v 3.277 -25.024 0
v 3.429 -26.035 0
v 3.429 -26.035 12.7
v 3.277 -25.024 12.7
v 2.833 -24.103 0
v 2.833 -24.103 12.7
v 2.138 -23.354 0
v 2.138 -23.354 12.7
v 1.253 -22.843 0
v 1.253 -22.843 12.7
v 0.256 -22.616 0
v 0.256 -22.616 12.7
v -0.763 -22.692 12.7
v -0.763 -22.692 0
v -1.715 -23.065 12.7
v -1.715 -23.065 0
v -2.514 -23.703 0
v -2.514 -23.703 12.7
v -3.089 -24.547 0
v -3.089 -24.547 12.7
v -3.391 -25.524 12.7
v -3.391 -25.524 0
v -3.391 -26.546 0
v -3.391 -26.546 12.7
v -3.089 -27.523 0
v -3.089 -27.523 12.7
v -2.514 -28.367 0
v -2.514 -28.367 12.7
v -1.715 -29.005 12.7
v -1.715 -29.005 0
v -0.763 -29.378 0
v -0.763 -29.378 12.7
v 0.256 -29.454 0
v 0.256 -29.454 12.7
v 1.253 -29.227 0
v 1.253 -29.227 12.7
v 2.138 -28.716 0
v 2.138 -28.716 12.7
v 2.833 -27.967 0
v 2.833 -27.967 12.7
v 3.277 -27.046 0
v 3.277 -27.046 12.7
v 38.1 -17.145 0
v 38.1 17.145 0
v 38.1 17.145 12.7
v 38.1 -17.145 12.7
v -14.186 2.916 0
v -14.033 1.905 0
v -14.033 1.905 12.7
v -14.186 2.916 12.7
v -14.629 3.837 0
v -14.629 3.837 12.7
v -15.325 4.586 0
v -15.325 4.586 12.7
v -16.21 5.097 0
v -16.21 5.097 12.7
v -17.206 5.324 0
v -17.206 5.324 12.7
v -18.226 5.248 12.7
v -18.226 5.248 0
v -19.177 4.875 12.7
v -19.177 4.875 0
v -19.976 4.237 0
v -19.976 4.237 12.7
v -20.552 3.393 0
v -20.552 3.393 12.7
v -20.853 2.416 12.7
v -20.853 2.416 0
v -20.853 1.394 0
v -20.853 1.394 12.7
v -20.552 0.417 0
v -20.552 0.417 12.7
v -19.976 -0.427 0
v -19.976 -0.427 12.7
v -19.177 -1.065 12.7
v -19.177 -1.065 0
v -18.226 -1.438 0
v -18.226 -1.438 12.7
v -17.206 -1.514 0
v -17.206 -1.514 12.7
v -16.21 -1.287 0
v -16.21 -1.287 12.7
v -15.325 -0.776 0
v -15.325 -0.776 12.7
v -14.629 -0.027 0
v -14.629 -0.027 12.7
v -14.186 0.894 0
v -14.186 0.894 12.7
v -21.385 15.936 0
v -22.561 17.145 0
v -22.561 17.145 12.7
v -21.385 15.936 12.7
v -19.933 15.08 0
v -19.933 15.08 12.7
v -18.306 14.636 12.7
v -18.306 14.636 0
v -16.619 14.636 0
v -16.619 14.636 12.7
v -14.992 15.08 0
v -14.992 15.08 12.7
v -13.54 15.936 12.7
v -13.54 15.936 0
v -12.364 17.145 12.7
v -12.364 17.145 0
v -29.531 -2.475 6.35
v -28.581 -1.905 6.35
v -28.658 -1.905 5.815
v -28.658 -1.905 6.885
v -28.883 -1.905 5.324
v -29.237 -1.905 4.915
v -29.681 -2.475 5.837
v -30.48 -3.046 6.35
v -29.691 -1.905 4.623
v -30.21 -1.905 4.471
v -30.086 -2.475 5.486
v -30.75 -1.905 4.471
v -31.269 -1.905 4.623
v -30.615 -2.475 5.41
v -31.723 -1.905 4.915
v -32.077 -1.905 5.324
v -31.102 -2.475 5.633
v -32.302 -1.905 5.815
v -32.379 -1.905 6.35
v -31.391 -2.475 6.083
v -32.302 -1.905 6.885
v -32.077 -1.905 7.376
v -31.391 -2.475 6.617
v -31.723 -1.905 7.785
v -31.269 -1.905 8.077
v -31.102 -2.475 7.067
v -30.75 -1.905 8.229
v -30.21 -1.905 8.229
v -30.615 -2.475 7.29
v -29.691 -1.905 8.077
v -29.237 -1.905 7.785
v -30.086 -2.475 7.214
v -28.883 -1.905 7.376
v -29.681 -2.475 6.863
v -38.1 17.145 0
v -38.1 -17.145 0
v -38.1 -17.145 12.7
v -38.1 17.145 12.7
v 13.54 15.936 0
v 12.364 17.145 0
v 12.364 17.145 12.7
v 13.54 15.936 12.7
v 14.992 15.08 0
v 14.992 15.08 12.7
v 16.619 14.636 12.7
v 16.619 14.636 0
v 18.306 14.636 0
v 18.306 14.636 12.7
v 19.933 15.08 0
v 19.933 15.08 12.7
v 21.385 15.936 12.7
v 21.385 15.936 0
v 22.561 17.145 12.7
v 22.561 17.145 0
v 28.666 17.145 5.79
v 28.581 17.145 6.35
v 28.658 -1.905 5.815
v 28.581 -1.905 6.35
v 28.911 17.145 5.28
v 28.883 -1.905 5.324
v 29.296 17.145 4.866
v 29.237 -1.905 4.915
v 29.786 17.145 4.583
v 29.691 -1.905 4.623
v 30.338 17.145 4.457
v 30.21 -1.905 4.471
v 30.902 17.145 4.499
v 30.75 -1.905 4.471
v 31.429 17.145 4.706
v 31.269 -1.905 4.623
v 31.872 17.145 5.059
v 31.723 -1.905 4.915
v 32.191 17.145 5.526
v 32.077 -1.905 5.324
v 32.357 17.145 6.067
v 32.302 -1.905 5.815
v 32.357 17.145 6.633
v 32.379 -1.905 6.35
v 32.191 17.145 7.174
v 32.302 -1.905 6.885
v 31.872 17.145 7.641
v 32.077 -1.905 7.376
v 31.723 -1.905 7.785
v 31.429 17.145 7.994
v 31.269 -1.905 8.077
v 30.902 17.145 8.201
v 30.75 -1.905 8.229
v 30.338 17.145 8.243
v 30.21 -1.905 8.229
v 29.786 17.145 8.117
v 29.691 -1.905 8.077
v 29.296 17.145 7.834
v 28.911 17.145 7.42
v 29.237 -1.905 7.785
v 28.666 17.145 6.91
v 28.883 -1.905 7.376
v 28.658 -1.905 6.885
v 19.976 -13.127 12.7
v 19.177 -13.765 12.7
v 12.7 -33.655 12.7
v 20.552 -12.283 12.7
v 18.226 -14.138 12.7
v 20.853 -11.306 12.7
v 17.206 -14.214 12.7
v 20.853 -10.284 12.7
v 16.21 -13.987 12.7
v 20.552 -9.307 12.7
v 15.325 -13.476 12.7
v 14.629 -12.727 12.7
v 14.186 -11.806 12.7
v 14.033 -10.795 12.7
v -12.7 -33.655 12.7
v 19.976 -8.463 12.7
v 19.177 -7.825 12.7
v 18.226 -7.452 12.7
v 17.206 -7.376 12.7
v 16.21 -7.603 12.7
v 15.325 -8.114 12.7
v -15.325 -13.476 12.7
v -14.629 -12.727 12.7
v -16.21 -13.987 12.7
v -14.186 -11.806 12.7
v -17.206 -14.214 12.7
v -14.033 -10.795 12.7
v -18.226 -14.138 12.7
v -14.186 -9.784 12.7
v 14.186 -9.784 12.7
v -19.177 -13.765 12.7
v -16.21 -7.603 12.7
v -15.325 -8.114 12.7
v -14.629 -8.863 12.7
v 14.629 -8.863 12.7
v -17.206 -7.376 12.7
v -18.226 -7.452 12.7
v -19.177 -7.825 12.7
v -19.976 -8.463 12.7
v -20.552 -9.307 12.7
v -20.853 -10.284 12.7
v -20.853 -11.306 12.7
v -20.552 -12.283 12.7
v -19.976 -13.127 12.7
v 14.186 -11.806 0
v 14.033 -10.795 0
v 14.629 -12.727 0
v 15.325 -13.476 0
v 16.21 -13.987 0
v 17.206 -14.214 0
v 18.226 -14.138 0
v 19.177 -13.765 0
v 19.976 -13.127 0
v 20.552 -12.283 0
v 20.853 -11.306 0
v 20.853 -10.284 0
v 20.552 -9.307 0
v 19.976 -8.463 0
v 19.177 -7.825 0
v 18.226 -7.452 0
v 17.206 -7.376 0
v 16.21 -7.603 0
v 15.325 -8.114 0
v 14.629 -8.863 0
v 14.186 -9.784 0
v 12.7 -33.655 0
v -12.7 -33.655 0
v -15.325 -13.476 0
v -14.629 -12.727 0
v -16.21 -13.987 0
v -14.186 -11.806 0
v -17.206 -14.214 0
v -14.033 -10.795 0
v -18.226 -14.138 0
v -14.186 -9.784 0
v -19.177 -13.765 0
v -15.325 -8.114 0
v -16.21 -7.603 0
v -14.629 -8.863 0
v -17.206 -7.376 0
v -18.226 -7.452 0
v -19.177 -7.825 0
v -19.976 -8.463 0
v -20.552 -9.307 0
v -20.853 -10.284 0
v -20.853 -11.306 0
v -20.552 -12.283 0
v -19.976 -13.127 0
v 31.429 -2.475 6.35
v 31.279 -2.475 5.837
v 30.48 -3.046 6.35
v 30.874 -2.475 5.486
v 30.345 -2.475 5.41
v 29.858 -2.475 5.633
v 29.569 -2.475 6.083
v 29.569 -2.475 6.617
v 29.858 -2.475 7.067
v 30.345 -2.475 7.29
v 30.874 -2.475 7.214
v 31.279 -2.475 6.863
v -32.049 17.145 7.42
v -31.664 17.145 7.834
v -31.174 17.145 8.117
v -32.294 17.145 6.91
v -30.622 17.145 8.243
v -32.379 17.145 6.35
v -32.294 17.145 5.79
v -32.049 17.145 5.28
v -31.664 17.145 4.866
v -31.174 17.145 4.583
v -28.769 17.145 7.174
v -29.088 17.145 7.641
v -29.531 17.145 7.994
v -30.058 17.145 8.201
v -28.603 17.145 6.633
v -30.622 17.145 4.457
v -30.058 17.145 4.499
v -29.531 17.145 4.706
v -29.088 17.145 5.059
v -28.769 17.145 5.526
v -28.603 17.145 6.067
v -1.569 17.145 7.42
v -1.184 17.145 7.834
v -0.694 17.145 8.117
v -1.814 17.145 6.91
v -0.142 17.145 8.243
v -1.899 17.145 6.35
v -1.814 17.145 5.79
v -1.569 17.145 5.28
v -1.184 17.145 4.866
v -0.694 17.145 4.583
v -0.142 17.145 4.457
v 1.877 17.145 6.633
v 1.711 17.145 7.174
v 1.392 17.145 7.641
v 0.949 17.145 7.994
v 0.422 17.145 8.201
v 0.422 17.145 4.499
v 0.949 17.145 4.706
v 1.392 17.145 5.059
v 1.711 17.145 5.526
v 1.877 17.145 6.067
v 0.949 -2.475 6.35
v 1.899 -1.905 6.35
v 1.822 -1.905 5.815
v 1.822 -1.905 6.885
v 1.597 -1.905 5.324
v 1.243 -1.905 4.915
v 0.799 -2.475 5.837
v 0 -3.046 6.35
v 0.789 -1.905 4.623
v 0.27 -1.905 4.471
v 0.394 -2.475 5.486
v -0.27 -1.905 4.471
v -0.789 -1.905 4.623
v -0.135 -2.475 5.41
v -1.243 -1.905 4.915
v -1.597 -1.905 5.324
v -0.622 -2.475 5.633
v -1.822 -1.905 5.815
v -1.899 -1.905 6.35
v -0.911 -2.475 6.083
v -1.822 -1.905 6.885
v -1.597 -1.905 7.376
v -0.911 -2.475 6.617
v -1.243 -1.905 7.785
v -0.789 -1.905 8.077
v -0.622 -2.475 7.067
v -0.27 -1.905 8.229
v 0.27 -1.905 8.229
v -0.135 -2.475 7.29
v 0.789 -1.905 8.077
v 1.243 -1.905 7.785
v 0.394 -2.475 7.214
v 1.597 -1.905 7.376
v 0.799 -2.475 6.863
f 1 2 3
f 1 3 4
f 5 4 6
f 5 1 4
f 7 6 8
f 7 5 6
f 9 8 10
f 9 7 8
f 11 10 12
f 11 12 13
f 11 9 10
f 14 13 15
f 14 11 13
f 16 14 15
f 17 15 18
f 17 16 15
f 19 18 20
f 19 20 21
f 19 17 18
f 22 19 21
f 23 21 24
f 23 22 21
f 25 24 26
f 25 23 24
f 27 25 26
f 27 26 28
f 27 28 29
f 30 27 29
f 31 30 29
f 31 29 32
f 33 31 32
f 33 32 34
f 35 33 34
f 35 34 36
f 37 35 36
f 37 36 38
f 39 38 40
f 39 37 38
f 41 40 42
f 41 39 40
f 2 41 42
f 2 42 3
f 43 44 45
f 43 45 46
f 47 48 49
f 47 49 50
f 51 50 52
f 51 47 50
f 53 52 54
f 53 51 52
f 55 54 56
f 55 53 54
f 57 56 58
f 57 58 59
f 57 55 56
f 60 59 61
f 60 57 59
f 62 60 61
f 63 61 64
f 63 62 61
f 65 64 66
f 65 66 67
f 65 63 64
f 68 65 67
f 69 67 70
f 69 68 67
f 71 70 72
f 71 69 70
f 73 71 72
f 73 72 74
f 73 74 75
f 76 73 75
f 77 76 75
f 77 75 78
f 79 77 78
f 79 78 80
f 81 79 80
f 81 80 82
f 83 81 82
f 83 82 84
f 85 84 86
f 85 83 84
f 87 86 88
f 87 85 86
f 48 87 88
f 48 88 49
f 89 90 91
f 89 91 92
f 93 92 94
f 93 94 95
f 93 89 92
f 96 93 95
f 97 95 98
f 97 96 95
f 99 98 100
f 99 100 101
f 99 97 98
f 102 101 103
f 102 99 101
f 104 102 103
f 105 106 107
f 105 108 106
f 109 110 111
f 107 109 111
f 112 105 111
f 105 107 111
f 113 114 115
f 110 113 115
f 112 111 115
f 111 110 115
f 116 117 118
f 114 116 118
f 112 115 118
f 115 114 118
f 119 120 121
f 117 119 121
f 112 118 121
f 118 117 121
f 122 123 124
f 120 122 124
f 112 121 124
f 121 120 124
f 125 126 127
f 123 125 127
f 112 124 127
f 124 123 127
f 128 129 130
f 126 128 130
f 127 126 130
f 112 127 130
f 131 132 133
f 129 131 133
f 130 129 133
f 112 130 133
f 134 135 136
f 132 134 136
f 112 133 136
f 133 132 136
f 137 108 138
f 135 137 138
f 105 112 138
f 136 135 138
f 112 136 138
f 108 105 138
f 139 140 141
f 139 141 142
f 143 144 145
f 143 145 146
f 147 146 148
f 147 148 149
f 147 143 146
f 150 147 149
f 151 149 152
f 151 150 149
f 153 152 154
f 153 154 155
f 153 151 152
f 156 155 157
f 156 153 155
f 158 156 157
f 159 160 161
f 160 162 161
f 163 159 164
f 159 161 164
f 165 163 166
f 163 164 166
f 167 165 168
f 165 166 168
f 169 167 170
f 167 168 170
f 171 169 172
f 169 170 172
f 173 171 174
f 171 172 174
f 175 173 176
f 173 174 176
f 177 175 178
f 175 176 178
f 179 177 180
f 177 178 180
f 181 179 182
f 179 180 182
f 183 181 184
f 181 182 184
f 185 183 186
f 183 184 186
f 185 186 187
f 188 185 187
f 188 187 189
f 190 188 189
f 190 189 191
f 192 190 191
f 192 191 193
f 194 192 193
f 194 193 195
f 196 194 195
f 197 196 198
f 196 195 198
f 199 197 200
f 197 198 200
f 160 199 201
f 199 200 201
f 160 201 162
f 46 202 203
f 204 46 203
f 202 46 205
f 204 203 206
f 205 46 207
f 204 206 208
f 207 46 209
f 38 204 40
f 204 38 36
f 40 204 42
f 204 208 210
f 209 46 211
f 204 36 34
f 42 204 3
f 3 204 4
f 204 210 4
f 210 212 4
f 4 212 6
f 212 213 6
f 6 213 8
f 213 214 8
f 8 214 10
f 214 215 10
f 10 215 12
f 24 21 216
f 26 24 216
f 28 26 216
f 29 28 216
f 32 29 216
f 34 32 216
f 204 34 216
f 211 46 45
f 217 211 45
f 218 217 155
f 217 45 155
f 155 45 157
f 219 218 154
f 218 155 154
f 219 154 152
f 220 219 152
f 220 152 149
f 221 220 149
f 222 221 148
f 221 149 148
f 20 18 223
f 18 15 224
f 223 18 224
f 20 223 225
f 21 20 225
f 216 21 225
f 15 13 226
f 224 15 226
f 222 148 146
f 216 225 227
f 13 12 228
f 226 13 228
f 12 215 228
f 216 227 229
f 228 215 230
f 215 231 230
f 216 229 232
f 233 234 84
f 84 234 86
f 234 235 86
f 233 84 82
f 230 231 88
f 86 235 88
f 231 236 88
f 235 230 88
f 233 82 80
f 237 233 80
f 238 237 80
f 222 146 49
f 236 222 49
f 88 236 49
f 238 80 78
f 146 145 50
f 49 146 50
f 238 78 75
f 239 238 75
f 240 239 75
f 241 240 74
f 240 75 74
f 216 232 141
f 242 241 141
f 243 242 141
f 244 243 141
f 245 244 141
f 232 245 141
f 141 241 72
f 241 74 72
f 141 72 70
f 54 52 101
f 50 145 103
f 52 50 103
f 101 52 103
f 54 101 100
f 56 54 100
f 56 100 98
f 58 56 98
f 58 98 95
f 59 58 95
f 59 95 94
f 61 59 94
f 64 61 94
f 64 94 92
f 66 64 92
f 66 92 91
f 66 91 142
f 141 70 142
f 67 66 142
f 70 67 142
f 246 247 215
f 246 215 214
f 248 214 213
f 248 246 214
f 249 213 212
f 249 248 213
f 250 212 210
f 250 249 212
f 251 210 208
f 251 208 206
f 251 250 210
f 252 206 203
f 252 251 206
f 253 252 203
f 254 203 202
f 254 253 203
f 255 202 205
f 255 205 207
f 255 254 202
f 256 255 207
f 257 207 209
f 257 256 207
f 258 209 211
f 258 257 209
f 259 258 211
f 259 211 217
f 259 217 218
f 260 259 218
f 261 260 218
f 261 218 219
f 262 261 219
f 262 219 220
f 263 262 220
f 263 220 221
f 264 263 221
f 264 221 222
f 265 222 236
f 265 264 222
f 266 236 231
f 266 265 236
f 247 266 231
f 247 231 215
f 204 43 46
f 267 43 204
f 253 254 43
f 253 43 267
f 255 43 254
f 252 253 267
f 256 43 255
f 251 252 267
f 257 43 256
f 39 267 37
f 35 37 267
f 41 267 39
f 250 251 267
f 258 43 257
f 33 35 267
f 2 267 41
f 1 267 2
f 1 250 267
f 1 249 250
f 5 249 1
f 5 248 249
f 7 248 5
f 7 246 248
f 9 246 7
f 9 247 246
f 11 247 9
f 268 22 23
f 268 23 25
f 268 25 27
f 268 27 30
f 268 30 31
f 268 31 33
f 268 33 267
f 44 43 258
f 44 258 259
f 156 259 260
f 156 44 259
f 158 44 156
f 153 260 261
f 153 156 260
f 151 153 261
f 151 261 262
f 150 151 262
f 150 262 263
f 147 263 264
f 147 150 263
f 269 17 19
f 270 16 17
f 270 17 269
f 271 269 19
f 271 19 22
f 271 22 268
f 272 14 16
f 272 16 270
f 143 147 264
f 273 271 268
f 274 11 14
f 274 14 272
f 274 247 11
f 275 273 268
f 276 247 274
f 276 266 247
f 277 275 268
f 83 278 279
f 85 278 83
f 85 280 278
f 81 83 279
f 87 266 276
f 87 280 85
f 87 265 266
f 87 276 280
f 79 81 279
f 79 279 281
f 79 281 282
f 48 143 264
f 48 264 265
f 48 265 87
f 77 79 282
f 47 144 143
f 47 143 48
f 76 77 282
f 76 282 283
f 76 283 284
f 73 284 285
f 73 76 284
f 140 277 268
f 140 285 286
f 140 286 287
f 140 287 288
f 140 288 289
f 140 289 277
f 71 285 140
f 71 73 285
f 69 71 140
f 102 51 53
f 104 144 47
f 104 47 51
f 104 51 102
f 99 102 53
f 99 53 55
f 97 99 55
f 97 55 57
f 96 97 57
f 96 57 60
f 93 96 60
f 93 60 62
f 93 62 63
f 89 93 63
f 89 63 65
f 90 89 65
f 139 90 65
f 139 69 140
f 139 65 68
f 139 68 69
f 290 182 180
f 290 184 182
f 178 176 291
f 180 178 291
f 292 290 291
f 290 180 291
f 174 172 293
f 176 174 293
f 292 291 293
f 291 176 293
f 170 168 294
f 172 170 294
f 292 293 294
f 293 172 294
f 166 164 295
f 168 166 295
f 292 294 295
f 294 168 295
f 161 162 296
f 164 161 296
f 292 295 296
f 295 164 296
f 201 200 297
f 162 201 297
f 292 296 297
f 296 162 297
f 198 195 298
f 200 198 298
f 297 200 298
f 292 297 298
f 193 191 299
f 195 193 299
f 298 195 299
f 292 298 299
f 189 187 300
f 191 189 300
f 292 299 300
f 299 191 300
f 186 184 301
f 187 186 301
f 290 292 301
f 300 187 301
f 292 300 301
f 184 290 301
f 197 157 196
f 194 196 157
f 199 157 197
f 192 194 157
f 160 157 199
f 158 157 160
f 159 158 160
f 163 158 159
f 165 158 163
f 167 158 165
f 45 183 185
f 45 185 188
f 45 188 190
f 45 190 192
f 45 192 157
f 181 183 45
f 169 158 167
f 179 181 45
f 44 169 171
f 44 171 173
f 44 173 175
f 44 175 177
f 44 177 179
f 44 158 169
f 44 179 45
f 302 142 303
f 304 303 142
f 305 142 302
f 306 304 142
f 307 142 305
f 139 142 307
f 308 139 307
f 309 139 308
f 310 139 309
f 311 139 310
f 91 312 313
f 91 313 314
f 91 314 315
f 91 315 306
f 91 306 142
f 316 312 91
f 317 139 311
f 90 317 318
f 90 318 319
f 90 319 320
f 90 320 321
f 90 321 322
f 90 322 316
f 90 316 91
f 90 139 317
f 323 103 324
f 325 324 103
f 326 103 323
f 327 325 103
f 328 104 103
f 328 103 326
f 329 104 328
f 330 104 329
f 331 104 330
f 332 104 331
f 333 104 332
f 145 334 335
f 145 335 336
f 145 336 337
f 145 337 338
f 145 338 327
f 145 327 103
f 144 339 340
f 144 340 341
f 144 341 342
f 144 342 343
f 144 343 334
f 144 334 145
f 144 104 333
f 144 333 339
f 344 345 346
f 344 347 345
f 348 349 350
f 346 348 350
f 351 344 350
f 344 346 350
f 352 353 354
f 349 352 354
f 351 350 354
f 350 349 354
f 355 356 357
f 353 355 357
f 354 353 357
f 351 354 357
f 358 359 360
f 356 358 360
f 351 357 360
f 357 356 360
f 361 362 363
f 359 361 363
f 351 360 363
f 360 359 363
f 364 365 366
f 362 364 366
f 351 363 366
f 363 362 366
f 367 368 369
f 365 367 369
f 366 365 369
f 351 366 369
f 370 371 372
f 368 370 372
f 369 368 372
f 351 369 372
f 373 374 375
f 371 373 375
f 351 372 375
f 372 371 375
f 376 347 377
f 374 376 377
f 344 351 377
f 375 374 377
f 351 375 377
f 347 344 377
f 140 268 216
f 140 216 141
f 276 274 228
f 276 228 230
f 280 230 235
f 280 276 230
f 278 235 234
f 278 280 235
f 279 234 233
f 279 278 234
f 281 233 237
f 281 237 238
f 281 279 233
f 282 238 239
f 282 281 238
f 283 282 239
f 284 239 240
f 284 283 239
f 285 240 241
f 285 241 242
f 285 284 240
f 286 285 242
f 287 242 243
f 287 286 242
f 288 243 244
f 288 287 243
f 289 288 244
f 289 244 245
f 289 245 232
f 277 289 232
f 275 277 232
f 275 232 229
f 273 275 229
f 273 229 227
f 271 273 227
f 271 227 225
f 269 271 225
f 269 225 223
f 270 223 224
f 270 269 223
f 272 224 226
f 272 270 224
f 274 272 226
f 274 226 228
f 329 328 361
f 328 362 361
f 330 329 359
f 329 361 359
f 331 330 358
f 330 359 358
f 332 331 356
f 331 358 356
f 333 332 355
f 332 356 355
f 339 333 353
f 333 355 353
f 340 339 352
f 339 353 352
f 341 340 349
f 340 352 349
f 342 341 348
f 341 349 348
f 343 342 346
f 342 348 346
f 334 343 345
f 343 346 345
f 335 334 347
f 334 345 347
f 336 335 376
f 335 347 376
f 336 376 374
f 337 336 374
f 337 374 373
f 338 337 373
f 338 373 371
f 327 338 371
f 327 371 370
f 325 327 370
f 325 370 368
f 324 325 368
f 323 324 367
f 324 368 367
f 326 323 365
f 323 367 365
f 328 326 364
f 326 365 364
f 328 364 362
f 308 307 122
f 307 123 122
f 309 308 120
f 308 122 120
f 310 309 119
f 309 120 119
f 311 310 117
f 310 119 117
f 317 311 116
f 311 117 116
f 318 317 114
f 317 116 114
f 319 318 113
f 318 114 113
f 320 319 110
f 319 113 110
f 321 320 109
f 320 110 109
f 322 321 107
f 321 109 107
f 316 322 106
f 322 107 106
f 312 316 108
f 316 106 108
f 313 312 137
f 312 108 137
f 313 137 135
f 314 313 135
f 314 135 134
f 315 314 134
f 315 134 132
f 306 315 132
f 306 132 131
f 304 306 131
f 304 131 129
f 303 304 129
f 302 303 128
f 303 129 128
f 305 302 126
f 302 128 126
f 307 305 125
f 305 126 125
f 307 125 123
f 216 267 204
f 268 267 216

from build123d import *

# Parameters (mm, degrees)
SKETCH1_R                  = 3.429
BOSS_EXTRUDE1_DEPTH        = 12.7
F_10_24_TAPPED_HOLE1_D     = 3.7973
F_10_24_TAPPED_HOLE1_DEPTH = 19.05
F_10_24_TAPPED_HOLE1_TIP   = 1.140824014


with BuildPart() as part:
    # Sketch1 → Boss-Extrude1 (new body)
    with BuildSketch(Plane.XY):
        with BuildLine():
            Line((-38.1, -17.145), (-38.1, 17.145))
            Line((-38.1, 17.145), (-22.561451151, 17.145))
            ThreePointArc((-22.561451151, 17.145), (-17.4625, 14.5796), (-12.363548849, 17.145))
            Line((-12.363548849, 17.145), (12.363548849, 17.145))
            ThreePointArc((12.363548849, 17.145), (17.4625, 14.5796), (22.561451151, 17.145))
            Line((22.561451151, 17.145), (38.1, 17.145))
            Line((38.1, 17.145), (38.1, -17.145))
            Line((38.1, -17.145), (12.7, -33.655))
            Line((12.7, -33.655), (-12.7, -33.655))
            Line((-12.7, -33.655), (-38.1, -17.145))
        make_face()
        with Locations((-17.4625, -10.795)):
            Circle(SKETCH1_R, mode=Mode.SUBTRACT)
        with Locations(Location((17.4625, -10.795, 0), (0, 0, 180))):
            Circle(SKETCH1_R, mode=Mode.SUBTRACT)
        with Locations((-17.4625, 1.905)):
            Circle(SKETCH1_R, mode=Mode.SUBTRACT)
        with Locations((0, -26.035)):
            Circle(SKETCH1_R, mode=Mode.SUBTRACT)
    extrude(amount=BOSS_EXTRUDE1_DEPTH)

    # #10-24 Tapped Hole1
    with Locations(Plane(origin=(0, 17.145, 0), x_dir=(1, 0, 0), z_dir=(0, 1, 0))):
        with Locations((-30.48, -6.35), (0, -6.35), (30.48, -6.35)):
            Hole(F_10_24_TAPPED_HOLE1_D / 2, depth=F_10_24_TAPPED_HOLE1_DEPTH)
            with Locations((0, 0, -(F_10_24_TAPPED_HOLE1_DEPTH + F_10_24_TAPPED_HOLE1_TIP / 2))):  # 118° drill point
                Cone(0, F_10_24_TAPPED_HOLE1_D / 2, F_10_24_TAPPED_HOLE1_TIP, mode=Mode.SUBTRACT)


solid = part.part
